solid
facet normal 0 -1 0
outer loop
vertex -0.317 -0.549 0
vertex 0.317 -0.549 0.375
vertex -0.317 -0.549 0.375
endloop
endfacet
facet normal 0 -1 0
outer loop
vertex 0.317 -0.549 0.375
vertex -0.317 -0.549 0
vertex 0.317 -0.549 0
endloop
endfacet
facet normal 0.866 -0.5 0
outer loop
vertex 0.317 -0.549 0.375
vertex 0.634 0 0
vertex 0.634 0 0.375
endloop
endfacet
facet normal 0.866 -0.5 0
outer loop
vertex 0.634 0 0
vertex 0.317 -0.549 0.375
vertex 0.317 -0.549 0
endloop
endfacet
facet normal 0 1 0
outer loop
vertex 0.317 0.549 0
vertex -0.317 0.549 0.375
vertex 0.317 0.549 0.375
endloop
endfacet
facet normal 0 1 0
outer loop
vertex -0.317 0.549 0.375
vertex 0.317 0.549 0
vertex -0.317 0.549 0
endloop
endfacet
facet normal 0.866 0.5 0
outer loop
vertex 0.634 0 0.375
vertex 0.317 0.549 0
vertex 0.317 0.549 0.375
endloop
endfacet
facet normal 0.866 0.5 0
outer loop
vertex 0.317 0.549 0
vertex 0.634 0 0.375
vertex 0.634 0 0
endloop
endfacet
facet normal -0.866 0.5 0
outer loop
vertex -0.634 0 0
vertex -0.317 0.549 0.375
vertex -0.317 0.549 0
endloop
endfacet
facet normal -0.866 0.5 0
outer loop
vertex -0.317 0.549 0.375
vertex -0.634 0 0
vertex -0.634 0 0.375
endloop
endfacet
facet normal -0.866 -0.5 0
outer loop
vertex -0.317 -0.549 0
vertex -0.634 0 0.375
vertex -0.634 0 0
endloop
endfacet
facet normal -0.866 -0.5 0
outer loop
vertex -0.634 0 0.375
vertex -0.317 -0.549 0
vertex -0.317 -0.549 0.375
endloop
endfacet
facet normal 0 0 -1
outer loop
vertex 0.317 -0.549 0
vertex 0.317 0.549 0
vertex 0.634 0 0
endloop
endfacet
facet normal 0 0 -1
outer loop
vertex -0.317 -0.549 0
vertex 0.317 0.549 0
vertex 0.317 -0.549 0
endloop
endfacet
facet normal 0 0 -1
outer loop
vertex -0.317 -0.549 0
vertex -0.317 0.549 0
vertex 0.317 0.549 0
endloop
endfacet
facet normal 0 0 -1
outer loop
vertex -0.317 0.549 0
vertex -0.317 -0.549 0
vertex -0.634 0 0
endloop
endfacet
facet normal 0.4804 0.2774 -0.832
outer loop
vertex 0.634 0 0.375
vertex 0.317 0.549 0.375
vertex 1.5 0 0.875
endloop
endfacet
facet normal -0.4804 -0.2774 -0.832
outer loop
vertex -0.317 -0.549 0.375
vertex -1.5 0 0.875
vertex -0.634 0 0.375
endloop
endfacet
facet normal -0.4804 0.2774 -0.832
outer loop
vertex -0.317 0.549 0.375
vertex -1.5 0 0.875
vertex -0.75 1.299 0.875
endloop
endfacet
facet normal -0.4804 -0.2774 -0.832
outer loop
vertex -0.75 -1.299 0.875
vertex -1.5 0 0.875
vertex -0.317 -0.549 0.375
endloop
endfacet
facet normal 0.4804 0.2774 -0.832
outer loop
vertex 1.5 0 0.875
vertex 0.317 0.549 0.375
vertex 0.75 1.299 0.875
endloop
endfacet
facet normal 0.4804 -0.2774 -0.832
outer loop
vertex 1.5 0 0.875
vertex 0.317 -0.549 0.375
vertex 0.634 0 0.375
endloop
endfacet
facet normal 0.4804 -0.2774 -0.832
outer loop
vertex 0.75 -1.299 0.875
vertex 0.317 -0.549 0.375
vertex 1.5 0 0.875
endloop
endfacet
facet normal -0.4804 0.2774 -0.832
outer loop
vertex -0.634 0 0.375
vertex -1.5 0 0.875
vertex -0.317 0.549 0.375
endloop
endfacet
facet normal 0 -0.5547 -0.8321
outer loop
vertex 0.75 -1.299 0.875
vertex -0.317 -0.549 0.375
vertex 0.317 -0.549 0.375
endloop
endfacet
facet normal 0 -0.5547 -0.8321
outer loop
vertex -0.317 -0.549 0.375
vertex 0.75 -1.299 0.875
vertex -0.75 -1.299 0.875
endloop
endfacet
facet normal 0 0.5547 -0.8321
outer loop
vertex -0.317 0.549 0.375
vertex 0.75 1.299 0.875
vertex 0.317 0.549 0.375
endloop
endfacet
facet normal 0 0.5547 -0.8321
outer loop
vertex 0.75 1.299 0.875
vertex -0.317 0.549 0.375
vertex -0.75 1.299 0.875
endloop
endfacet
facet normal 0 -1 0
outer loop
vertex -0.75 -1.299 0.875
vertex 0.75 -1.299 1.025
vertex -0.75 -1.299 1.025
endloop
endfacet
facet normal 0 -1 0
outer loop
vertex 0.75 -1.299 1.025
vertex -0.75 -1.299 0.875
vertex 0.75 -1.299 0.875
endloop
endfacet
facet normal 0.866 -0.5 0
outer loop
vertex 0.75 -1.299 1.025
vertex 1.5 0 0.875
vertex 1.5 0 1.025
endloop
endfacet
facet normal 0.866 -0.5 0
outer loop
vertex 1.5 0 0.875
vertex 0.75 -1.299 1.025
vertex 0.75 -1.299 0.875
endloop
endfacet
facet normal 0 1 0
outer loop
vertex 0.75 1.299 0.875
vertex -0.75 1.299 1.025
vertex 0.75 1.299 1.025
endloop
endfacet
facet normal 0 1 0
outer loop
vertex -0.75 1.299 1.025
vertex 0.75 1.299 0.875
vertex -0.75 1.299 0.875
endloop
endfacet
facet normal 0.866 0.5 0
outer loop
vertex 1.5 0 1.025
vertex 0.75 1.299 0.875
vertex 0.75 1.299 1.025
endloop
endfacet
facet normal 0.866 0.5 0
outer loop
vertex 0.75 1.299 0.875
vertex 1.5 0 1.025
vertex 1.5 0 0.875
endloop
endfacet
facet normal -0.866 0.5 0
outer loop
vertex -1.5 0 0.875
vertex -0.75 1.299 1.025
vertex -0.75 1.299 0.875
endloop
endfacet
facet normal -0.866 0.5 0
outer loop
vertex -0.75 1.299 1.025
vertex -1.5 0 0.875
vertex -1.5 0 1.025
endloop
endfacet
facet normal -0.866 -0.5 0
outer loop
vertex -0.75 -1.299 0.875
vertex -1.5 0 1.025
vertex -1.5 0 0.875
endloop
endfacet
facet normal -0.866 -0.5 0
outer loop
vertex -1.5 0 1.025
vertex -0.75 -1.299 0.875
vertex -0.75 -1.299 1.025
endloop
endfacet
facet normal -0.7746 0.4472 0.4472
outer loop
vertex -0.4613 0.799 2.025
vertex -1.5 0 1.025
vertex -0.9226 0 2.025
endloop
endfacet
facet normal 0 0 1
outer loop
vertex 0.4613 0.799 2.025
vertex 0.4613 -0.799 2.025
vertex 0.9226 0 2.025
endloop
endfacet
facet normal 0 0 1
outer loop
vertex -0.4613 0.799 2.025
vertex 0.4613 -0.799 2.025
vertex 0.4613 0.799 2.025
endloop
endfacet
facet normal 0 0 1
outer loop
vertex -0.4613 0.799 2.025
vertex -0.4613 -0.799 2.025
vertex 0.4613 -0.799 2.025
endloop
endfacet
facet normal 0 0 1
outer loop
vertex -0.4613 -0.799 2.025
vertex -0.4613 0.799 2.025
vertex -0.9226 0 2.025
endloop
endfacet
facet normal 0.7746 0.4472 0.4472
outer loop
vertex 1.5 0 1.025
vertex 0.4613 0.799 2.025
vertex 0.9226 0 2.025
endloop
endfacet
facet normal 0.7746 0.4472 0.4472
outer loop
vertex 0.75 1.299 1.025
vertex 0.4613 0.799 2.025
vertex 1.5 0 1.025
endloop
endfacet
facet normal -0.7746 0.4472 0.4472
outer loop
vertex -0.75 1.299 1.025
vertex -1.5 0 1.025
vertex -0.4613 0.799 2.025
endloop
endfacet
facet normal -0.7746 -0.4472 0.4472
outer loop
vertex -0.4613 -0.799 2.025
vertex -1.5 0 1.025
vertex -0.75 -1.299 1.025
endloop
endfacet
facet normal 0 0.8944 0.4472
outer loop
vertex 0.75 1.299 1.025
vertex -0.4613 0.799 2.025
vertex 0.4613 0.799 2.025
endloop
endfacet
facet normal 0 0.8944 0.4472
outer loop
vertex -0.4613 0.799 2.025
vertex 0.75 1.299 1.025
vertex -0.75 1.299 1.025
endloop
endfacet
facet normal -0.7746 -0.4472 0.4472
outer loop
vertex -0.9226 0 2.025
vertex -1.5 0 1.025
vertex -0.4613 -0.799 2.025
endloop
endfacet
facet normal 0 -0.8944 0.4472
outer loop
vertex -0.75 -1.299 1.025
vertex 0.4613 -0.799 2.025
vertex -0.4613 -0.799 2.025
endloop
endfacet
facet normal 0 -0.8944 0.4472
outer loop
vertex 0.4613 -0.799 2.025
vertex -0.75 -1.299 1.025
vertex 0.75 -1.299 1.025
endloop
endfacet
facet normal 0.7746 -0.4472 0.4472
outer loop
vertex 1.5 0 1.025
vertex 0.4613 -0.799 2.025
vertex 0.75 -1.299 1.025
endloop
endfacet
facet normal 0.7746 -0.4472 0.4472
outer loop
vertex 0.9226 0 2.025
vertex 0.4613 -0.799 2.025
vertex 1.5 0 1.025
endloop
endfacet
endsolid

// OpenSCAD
// file: math-utils.scad
/*
 * Title: math-utils.scad
 * Author: [Your Name]
 * Organization: [Your Organization]
 *
 * Description:
 *   This function calculates the radius at a given angle, taking into account the initial radius 
 *   and height. It is designed to work with angles in a 2D plane and adjusts the radius based 
 *   on the tangent of the angle. The function handles angles within the first and second quadrants 
 *   (0-180 degrees) by normalizing them to 0-90 degrees.
 *
 * Parameters:
 *   angle - The angle at which the radius is to be calculated, in degrees.
 *   r - The initial radius before any height adjustment.
 *   height - The height at which the radius is to be adjusted.
 *
 * Returns:
 *   The adjusted radius based on the given angle, initial radius, and height.
 *
 * Usage Notes:
 *   - The angle should be provided in degrees.
 *   - The function is particularly useful in calculations involving conical shapes or spiral calculations.
 *   - This function assumes a linear relationship between the height and the radius change.
 *
 * Example:
 *   calculateRadFromAngle(45, 10, 5) // Calculate the radius at a 45-degree angle, with an initial radius of 10 and a height of 5.
 *
 * Revision History:
 *   [YYYY-MM-DD] - Initial version.
 *   [YYYY-MM-DD] - Subsequent updates with details.
 */


// Function to calculate radius based on angle, initial radius, and height
function calculateRadFromAngle(angle, r, height) = 
    let(norm_angle = angle % 90)
    (angle < 90)
        ? r + tan((abs(90 - norm_angle))) * height
        : r - tan((norm_angle)) * height;
// main file
/*
 * Title: Tricho Geometric Structure Generator
 * Author: [Your Name]
 * Organization: [Your Organization]
 *
 * License: [Specify License]
 *
 * Description:
 *   This OpenSCAD script, named 'tricho.scad', is designed to generate a complex geometric 
 *   structure called 'tricho'. The structure is composed of various cylindrical segments 
 *   (alpha, beta, omega, and interstitial segments), each defined by specific radii, heights, 
 *   and angles. The script provides a modular approach to constructing these segments and 
 *   assembling them into the complete 'tricho' structure. Additionally, it allows placing 
 *   multiple 'tricho' structures at specified center points, enabling the creation of intricate 
 *   geometric patterns.
 *
 * Dependencies:
 *   math-utils.scad - Required for mathematical operations and calculations.
 *
 * Usage Notes:
 *   - Include this script in your OpenSCAD project to generate 'tricho' structures.
 *   - Customize the 'tricho' by adjusting the radius, angle, height, and segment parameters.
 *   - The 'place_trichos_at_centers' module can be used to replicate the 'tricho' structure 
 *     at various points in a design.
 *   - Ensure that 'math-utils.scad' is accessible in your project directory.
 *
 * Parameters:
 *   r - Base radius for the 'tricho' structure.
 *   beta, alpha, omega - Angles for the respective segments.
 *   beta_h, alpha_h, omega_h - Heights for the respective segments.
 *   inter_h - Height of the interstitial segment.
 *   segments - Number of facets for the cylinders.
 *
 * Revision History:
 *   [YYYY-MM-DD] - Initial version.
 *   [YYYY-MM-DD] - Subsequent updates with details.
 */


use <math-utils.scad>;


module tricho(r, beta, beta_h, alpha, alpha_h, omega, omega_h, inter_h) {

    ref = 270;

    beta_angle = beta;
    beta_angle_ref = ref - beta_angle;
    beta_height = beta_h;   // by default it is radius / 4;

    alpha_angle = alpha;
    alpha_angle_ref = ref - alpha_angle;
    alpha_height = alpha_h; //  by default it is radius / 3

    omega_angle = omega;
    omega_angle_ref = ref - omega_angle;
    omega_height = omega_h; //  by default it is radius * 2 / 3;
    inter_height = inter_h; //  by default it is radius / 10;

    segments = 6;

    // Calculating radii
    alpha_r1 = calculateRadFromAngle(alpha_angle_ref, r, alpha_height);
    alpha_r2 = r;
    beta_r1 = calculateRadFromAngle(beta_angle_ref, alpha_r1, beta_height);
    beta_r2 = alpha_r1;
    omega_r1 = r;
    omega_r2 = calculateRadFromAngle(omega_angle_ref, radius, omega_height);

    // Vectors for parameters
    alpha_vector = [alpha_height, alpha_r1, alpha_r2];
    beta_vector = [beta_height, beta_r1, beta_r2];
    omega_vector = [omega_height, omega_r1, omega_r2];

    echo("Section: Beta, Radius 1:", beta_vector[1], "Radius 2:", beta_vector[2], "Height:", beta_vector[0], "Angle:", beta_angle);
    echo("Section: Alpha, Radius 1:", alpha_vector[1], "Radius 2:", alpha_vector[2], "Height:", alpha_vector[0], "Angle:", alpha_angle);
    echo("Section: Interstitial, Radius 1:", alpha_vector[2], "Radius 2:", omega_vector[1], "Height:", inter_height, "Angle: -");
    echo("Section: Omega, Radius 1:", omega_vector[1], "Radius 2:", omega_vector[2], "Height:", omega_vector[0], "Angle:", omega_angle);


    tricho_geo(alpha_vector, beta_vector, inter_height, omega_vector, segments);
}

// Function to construct the tricho model
module tricho_geo(alpha_vec, beta_vec, inter_h, omega_vec, segs) {
    // Beta segment
    translate([0, 0, 0])
        cylinder(h = beta_vec[0], r1 = beta_vec[1], r2 = beta_vec[2], $fn = segs);

    // Alpha segment
    translate([0, 0, beta_vec[0]])
        cylinder(h = alpha_vec[0], r1 = alpha_vec[1], r2 = alpha_vec[2], $fn = segs);

    // Interstitial segment
    translate([0, 0, beta_vec[0] + alpha_vec[0]])
        cylinder(h = inter_h, r1 = alpha_vec[2], r2 = omega_vec[1], $fn = segs);

    // Omega segment
    translate([0, 0, beta_vec[0] + alpha_vec[0] + inter_h])
        cylinder(h = omega_vec[0], r1 = omega_vec[1], r2 = omega_vec[2], $fn = segs);
} 



// Place a tricho at each hexagon center
module place_trichos_at_centers(centers, r, beta_angle, beta_height, alpha_angle, 
            alpha_height, omega_angle, omega_height, inter_height) {
    for (center = centers) {
        translate([center[0], center[1], 0]) 
        tricho(r=r, beta=beta_angle, beta_h=beta_height, alpha=alpha_angle, 
            alpha_h=alpha_height, omega=omega_angle, omega_h=omega_height, inter_h=inter_height); 
    }
}


// Tricho Params
radius = 1.5;

// Angle paramters
beta_angle = 90;
alpha_angle = 30;
omega_angle = 60;
segments = 6;

// Derived example parameters
beta_height = radius / 4;
alpha_height = radius / 3;
omega_height = radius * 2 / 3;
inter_height = radius / 10;


tricho(r=radius, beta=beta_angle, beta_h=beta_height, alpha=alpha_angle, alpha_h=alpha_height, omega=omega_angle, omega_h=omega_height, inter_h=inter_height); 
